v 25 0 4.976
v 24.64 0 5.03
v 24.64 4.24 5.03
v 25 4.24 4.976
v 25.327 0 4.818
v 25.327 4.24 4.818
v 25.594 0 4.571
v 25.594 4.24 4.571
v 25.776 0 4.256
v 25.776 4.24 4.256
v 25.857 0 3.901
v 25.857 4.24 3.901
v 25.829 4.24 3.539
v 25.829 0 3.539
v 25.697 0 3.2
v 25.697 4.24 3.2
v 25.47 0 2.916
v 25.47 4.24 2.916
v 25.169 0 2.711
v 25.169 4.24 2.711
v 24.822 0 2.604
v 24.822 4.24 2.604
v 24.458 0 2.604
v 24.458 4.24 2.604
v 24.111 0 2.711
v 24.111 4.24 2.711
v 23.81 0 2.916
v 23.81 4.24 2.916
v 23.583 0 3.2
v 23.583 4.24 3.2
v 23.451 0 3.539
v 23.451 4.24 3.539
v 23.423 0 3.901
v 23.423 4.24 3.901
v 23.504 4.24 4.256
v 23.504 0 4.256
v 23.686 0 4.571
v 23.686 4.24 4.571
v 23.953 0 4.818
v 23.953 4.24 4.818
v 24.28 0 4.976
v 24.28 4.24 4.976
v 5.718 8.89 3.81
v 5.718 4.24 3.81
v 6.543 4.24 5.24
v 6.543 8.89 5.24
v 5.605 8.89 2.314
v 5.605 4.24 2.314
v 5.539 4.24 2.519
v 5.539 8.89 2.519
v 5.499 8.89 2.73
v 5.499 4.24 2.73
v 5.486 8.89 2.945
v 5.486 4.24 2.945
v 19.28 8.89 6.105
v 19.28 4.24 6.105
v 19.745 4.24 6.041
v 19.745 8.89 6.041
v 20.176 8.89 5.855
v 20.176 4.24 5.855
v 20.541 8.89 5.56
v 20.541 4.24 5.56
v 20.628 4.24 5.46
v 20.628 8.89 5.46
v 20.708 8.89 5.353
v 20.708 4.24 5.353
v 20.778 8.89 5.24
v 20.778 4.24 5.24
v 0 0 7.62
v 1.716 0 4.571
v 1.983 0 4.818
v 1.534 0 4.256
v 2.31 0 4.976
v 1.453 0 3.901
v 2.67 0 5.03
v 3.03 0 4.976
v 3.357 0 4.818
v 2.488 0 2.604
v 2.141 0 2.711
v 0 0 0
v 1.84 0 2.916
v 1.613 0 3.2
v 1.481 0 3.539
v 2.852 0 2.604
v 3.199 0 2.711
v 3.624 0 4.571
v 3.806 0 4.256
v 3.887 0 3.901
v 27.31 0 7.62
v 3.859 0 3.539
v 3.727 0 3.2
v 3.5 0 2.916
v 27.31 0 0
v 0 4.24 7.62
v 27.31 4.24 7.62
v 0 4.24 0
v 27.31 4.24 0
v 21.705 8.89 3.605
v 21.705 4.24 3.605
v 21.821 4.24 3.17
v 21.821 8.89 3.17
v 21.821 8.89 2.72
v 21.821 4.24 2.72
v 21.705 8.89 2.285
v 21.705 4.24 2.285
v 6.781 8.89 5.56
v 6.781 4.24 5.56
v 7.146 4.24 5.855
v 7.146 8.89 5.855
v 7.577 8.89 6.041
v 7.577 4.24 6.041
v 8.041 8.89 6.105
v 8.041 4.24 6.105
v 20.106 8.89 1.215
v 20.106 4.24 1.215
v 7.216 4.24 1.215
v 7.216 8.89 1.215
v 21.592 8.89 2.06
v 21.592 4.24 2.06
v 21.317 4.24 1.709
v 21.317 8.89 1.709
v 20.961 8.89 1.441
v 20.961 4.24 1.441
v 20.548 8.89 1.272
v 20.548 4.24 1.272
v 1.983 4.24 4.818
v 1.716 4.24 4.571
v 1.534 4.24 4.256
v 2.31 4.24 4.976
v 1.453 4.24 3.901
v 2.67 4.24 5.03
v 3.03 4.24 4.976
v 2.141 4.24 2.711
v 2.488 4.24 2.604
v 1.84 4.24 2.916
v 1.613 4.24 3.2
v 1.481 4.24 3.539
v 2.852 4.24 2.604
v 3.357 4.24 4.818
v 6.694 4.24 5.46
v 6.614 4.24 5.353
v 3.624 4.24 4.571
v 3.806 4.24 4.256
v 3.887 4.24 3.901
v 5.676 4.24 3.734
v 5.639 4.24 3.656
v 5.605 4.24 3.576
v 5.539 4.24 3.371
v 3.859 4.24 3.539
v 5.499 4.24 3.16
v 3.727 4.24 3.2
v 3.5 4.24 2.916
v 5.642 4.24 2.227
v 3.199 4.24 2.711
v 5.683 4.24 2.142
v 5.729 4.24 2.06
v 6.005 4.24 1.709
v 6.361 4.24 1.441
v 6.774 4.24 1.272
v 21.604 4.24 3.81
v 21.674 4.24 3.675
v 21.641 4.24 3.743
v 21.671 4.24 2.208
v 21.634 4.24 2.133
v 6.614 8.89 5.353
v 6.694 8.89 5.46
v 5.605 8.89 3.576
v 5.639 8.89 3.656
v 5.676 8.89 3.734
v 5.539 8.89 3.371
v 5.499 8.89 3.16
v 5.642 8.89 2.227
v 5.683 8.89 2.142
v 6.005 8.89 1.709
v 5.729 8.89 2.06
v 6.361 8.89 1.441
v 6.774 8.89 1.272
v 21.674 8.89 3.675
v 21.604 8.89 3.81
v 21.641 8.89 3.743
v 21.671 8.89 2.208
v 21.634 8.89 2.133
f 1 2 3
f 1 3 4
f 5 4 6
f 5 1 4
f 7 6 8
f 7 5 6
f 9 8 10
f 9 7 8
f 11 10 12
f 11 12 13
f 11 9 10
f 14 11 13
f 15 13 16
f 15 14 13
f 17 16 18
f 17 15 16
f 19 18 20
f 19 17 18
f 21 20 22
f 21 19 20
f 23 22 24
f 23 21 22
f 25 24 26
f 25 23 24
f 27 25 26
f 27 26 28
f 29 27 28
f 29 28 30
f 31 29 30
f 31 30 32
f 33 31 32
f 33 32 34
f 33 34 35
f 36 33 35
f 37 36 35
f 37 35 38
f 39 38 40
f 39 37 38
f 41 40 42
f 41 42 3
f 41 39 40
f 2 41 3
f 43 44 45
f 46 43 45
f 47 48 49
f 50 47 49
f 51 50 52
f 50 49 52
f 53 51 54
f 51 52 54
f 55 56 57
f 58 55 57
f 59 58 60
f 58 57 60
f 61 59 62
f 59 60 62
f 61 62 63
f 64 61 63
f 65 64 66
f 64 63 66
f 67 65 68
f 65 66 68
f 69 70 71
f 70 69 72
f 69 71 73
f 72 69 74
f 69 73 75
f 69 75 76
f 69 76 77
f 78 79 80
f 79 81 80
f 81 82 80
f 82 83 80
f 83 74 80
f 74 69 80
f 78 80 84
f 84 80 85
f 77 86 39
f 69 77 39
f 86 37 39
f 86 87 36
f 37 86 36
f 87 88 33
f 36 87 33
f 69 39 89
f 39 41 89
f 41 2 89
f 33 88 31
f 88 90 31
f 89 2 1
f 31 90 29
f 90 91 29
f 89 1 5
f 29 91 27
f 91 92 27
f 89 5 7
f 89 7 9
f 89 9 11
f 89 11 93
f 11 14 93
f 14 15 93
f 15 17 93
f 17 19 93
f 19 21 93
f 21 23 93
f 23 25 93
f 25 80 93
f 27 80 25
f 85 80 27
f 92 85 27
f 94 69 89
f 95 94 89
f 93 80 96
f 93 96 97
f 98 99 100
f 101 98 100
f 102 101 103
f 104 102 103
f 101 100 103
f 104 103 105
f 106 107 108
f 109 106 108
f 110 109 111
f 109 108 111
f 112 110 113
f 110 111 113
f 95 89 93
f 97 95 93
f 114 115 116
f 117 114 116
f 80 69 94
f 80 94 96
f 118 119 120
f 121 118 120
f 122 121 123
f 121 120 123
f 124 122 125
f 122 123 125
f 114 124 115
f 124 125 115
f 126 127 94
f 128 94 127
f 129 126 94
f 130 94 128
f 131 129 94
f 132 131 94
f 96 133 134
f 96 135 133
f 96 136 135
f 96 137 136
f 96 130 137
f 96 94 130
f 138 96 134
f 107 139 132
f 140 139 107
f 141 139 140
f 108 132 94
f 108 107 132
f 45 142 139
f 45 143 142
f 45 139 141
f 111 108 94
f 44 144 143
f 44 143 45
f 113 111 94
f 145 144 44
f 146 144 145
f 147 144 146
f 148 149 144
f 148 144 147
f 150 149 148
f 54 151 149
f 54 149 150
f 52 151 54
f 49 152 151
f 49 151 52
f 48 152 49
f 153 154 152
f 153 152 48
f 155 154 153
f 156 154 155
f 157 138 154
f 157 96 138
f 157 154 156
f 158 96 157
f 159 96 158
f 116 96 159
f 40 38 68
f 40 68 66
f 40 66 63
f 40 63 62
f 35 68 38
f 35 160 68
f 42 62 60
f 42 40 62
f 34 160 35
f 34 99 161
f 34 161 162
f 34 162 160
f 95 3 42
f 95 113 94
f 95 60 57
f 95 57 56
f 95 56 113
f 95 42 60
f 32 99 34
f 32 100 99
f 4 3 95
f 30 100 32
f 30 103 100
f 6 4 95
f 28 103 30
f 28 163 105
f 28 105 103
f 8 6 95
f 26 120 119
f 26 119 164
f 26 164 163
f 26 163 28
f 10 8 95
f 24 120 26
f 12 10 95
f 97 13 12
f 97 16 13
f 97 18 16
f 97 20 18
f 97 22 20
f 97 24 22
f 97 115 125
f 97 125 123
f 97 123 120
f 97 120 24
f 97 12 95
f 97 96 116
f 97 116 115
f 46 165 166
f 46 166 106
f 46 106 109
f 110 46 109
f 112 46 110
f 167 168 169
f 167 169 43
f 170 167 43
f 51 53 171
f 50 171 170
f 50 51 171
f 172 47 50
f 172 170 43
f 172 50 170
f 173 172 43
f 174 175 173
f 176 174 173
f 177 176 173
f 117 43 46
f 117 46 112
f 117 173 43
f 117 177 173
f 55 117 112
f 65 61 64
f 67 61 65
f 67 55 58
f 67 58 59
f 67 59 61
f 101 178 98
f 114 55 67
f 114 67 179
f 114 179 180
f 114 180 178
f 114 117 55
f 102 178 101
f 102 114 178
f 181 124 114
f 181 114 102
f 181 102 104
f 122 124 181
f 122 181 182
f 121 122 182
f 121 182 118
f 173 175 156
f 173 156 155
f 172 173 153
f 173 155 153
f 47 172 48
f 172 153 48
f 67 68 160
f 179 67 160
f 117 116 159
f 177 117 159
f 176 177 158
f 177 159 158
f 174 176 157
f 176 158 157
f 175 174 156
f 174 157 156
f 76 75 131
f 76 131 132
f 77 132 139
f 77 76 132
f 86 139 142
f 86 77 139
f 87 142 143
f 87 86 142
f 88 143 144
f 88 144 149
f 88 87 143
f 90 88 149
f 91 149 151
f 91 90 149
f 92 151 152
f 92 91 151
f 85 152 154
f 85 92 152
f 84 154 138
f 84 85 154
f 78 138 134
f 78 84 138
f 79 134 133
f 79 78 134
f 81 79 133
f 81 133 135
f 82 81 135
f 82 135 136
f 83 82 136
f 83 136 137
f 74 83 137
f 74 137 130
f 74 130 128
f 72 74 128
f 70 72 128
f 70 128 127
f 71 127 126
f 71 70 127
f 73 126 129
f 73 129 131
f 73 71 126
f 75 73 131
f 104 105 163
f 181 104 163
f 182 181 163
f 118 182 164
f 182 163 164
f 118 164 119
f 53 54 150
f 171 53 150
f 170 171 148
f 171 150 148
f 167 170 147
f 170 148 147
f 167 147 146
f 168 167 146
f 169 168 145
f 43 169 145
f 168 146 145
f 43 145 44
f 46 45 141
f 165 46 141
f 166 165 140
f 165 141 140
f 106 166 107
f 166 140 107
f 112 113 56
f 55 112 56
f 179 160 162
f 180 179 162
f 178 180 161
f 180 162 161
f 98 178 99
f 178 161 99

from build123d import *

# Parameters (mm, degrees)
SKETCH1_W           = 27.31
SKETCH1_H           = 7.62
SKETCH1_R           = 1.22
BOSS_EXTRUDE1_DEPTH = 4.24
BOSS_EXTRUDE2_DEPTH = 8.89


with BuildPart() as part:
    # Sketch1 → Boss-Extrude1 (new body)
    with BuildSketch(Plane(origin=(0, 0, 0), x_dir=(1, 0, 0), z_dir=(0, 1, 0))):
        with Locations((13.655, -3.81)):
            Rectangle(SKETCH1_W, SKETCH1_H)
        with BuildLine():
            Line((20.540684506, -5.56), (6.781053245, -5.56))
            ThreePointArc((6.781053245, -5.56), (6.652905637, -5.406873008), (6.543255812, -5.24))
            Line((6.543255812, -5.24), (5.717644927, -3.81))
            ThreePointArc((5.717644927, -3.81), (5.656921043, -3.695054436), (5.605, -3.575873574))
            Line((5.605, -3.575873574), (5.605, -2.314126426))
            ThreePointArc((5.605, -2.314126426), (5.661981888, -2.184516451), (5.729371314, -2.06))
            Line((5.729371314, -2.06), (21.592366437, -2.06))
            ThreePointArc((21.592366437, -2.06), (21.652777263, -2.17041983), (21.705, -2.284939665))
            Line((21.705, -2.284939665), (21.705, -3.605060335))
            ThreePointArc((21.705, -3.605060335), (21.65793272, -3.709197501), (21.604092824, -3.81))
            Line((21.604092824, -3.81), (20.778481939, -5.24))
            ThreePointArc((20.778481939, -5.24), (20.668832114, -5.406873008), (20.540684506, -5.56))
        make_face(mode=Mode.SUBTRACT)
        with Locations((2.67, -3.81)):
            Circle(SKETCH1_R, mode=Mode.SUBTRACT)
        with Locations((24.64, -3.81)):
            Circle(SKETCH1_R, mode=Mode.SUBTRACT)
    extrude(amount=BOSS_EXTRUDE1_DEPTH)

    # Sketch1<2> → Boss-Extrude2 (add)
    with BuildSketch(Plane(origin=(0, 0, 0), x_dir=(1, 0, 0), z_dir=(0, 1, 0))):
        with BuildLine():
            Line((8.04147976, -6.105), (19.28025799, -6.105))
            ThreePointArc((19.28025799, -6.105), (20.14525799, -5.873223949), (20.778481939, -5.24))
            Line((20.778481939, -5.24), (21.604092824, -3.81))
            ThreePointArc((21.604092824, -3.81), (21.604092824, -2.08), (20.105868875, -1.215))
            Line((20.105868875, -1.215), (7.215868875, -1.215))
            ThreePointArc((7.215868875, -1.215), (5.717644927, -2.08), (5.717644927, -3.81))
            Line((5.717644927, -3.81), (6.543255812, -5.24))
            ThreePointArc((6.543255812, -5.24), (7.17647976, -5.873223949), (8.04147976, -6.105))
        make_face()
    extrude(amount=BOSS_EXTRUDE2_DEPTH)


solid = part.part
